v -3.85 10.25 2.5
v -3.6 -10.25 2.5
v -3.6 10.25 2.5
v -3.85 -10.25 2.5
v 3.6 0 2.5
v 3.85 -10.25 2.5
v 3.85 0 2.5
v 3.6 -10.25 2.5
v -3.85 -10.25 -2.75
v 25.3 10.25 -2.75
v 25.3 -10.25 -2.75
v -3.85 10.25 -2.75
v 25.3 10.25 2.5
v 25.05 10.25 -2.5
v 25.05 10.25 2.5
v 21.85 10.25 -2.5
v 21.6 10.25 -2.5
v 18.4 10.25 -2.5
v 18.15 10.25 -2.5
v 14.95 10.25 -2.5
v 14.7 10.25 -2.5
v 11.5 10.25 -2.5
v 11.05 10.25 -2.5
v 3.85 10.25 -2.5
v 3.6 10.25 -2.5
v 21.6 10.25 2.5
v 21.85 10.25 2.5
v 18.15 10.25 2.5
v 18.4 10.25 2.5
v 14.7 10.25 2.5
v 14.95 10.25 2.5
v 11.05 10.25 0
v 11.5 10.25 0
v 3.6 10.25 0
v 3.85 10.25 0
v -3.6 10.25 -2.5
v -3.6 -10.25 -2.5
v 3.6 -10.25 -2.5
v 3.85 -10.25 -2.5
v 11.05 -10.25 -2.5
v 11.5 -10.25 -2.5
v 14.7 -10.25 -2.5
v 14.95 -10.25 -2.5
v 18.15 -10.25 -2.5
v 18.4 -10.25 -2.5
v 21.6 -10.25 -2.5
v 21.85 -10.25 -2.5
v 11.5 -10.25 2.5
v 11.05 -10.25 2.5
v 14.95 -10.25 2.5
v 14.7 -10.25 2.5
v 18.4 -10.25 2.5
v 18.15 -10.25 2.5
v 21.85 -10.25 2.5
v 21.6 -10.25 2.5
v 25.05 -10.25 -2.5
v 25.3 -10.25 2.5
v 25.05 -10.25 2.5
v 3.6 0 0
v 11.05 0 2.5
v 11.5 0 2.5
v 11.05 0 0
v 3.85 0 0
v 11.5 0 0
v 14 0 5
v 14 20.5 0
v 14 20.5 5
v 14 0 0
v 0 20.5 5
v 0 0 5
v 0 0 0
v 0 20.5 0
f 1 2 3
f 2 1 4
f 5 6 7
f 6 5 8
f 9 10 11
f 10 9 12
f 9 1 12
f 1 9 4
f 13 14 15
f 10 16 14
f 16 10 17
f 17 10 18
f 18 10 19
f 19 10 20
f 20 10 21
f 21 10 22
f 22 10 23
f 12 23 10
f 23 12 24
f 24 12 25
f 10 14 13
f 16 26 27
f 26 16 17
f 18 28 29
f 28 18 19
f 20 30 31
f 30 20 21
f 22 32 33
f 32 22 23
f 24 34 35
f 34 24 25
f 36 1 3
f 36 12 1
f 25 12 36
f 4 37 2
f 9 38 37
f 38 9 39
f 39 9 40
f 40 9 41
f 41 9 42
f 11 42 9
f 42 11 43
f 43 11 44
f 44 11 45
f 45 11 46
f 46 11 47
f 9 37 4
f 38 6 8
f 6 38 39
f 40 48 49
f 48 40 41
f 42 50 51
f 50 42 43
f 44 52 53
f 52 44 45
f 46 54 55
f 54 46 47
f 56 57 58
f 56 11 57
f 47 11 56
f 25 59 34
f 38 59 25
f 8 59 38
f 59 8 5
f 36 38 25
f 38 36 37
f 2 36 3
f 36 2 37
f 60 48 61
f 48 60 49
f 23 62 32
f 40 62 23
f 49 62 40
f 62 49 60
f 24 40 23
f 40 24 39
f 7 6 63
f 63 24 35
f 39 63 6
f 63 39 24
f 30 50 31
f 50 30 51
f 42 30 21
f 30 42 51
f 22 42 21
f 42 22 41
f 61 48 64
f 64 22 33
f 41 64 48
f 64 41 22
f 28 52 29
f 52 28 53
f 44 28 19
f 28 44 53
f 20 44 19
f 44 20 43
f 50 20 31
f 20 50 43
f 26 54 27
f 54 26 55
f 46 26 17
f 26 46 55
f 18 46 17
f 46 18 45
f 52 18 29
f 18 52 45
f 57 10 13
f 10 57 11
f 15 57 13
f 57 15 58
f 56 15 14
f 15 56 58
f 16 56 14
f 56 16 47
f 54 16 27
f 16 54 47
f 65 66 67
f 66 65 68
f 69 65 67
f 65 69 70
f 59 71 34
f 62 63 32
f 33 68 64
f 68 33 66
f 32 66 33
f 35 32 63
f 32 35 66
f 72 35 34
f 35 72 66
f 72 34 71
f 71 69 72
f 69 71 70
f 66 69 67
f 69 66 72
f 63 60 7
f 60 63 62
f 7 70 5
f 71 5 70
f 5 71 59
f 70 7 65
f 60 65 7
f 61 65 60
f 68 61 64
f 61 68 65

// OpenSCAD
cable_holder_length = 20;
cable_holder_height = 5;
cable_holder_wall_thickness = 0.25;
cable_large_thickness = 7;
cable_small_thickness = 3;
cable_large_count = 2;
cable_small_count = 4;
cable_thickness_slack = 0.1;

module cable_holder(thickness) {
    thickness = thickness + cable_thickness_slack * 2;
    wall_thickness = cable_holder_wall_thickness * 2;

    
    difference() {       
        color("red", 0.5)
        translate([0, 0, -wall_thickness * 0.25])
        cube([
            thickness + wall_thickness,
            cable_holder_length + wall_thickness, 
            cable_holder_height + wall_thickness * 0.5
        ],
        true);
        color("blue", 0.5)
        cube(
            [thickness, cable_holder_length + wall_thickness, cable_holder_height], 
            true
        );
   }
}

module cables_subunit(thickness, count) {
    for (n = [0 : count - 1]) {
        translate([
            n * 
            (thickness + cable_thickness_slack * 2 + cable_holder_wall_thickness),
            0,
            0,
        ])
        cable_holder(thickness);
    }    
}

module cable_holder_unit() {
    cables_subunit(cable_large_thickness, cable_large_count);
    translate([cable_large_count * (cable_large_thickness - cable_thickness_slack * 2 - cable_holder_wall_thickness), 0, 0]) cables_subunit(cable_small_thickness, cable_small_count);
}


cable_holder_unit();
color("green", 0.5)
cube([cable_large_thickness * cable_large_count, cable_holder_length + cable_holder_wall_thickness * 2, cable_holder_height]);
